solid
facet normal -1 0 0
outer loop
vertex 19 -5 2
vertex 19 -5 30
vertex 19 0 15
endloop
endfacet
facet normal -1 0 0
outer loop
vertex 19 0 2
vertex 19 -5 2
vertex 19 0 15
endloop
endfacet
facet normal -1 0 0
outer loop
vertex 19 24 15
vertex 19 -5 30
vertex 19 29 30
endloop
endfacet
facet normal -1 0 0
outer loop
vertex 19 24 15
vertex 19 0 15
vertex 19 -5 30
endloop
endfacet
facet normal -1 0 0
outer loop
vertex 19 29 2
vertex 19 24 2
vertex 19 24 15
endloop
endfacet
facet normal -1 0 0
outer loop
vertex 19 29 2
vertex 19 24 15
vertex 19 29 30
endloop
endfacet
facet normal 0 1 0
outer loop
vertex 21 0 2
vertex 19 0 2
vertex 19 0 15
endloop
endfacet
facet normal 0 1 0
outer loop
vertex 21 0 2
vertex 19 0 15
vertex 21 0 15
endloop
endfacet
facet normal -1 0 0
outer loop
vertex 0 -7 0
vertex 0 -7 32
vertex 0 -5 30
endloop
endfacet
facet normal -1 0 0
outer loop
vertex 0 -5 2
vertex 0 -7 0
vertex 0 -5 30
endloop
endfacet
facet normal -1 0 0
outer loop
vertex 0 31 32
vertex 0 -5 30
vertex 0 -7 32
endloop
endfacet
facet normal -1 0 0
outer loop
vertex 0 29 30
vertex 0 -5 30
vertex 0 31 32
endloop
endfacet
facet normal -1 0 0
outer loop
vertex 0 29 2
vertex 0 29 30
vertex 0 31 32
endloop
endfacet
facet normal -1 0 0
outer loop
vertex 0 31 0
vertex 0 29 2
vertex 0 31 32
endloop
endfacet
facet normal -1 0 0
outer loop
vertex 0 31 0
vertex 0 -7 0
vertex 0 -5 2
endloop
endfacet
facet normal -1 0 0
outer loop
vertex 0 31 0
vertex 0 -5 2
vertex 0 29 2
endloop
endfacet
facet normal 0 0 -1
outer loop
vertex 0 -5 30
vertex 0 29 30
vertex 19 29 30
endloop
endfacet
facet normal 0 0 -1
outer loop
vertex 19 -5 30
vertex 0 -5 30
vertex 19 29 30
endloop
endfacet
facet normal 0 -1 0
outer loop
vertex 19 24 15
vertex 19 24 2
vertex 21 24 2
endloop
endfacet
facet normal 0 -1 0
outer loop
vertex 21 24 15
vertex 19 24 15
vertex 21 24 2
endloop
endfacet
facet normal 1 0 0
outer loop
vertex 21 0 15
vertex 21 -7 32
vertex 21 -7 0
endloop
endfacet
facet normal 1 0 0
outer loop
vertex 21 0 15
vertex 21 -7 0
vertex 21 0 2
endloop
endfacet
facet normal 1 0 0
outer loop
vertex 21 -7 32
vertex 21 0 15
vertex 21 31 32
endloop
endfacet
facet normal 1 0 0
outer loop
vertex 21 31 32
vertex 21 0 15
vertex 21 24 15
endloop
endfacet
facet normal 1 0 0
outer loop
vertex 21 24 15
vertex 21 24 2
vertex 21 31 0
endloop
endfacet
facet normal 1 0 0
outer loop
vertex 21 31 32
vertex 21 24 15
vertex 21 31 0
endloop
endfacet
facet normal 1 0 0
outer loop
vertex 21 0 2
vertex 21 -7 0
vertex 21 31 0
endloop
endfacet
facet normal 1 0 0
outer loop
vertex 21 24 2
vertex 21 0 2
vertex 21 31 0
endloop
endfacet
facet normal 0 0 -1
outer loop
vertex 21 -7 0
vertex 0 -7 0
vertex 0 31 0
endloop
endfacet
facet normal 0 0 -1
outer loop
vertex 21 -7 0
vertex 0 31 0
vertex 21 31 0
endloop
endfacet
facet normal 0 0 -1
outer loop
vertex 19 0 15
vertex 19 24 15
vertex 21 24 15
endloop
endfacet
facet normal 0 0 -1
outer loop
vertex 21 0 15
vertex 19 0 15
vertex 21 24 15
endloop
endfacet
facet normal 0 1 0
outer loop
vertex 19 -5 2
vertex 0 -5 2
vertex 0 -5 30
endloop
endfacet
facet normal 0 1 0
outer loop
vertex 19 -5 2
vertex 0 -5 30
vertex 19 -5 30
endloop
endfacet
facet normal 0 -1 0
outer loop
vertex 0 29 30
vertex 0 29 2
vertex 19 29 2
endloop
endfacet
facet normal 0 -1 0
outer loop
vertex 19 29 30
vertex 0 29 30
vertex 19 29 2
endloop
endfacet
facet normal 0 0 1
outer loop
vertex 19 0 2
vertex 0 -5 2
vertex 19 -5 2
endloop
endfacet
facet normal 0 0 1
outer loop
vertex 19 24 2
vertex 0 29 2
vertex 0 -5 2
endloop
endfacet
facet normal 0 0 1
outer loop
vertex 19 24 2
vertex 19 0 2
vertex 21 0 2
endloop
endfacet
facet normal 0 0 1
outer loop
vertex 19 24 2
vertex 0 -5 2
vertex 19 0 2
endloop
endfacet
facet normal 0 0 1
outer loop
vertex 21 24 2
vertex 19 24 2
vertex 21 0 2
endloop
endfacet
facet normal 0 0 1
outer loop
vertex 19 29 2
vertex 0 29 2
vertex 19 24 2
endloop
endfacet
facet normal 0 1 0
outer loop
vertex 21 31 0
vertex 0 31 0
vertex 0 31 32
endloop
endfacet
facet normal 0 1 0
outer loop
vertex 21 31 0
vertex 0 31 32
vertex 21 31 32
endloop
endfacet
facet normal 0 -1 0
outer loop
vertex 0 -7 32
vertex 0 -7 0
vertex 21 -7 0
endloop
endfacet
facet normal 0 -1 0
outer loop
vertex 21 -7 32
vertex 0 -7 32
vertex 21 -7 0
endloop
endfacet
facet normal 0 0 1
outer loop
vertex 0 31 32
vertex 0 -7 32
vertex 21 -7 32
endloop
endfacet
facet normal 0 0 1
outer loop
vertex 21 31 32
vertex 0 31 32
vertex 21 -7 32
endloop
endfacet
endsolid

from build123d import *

# Parameters (mm, degrees)
BOX002002_W     = 22
BOX002002_H     = 24
BOX002002_DEPTH = 13
BOX002_W        = 19
BOX002_H        = 34
BOX002_DEPTH    = 28
BOX002001_W     = 21
BOX002001_H     = 38
BOX002001_DEPTH = 32


with BuildPart() as box002002:
    # Box002002 → Box002002 (new body)
    with BuildSketch(Plane.XY.offset(2)):
        with Locations((11, 12)):
            Rectangle(BOX002002_W, BOX002002_H)
    extrude(amount=BOX002002_DEPTH)


with BuildPart() as fusion007:
    # Box002 → Box002 (new body)
    with BuildSketch(Plane(origin=(0, -5, 2), x_dir=(1, 0, 0), z_dir=(0, 0, 1))):
        with Locations((9.5, 17)):
            Rectangle(BOX002_W, BOX002_H)
    extrude(amount=BOX002_DEPTH)

    # Fusion007: union Box002002
    add(box002002.part)


with BuildPart() as cut:
    # Box002001 → Box002001 (new body)
    with BuildSketch(Plane(origin=(0, -7, 0), x_dir=(1, 0, 0), z_dir=(0, 0, 1))):
        with Locations((10.5, 19)):
            Rectangle(BOX002001_W, BOX002001_H)
    extrude(amount=BOX002001_DEPTH)

    # Cut: cut Fusion007
    add(fusion007.part, mode=Mode.SUBTRACT)


solid = cut.part
